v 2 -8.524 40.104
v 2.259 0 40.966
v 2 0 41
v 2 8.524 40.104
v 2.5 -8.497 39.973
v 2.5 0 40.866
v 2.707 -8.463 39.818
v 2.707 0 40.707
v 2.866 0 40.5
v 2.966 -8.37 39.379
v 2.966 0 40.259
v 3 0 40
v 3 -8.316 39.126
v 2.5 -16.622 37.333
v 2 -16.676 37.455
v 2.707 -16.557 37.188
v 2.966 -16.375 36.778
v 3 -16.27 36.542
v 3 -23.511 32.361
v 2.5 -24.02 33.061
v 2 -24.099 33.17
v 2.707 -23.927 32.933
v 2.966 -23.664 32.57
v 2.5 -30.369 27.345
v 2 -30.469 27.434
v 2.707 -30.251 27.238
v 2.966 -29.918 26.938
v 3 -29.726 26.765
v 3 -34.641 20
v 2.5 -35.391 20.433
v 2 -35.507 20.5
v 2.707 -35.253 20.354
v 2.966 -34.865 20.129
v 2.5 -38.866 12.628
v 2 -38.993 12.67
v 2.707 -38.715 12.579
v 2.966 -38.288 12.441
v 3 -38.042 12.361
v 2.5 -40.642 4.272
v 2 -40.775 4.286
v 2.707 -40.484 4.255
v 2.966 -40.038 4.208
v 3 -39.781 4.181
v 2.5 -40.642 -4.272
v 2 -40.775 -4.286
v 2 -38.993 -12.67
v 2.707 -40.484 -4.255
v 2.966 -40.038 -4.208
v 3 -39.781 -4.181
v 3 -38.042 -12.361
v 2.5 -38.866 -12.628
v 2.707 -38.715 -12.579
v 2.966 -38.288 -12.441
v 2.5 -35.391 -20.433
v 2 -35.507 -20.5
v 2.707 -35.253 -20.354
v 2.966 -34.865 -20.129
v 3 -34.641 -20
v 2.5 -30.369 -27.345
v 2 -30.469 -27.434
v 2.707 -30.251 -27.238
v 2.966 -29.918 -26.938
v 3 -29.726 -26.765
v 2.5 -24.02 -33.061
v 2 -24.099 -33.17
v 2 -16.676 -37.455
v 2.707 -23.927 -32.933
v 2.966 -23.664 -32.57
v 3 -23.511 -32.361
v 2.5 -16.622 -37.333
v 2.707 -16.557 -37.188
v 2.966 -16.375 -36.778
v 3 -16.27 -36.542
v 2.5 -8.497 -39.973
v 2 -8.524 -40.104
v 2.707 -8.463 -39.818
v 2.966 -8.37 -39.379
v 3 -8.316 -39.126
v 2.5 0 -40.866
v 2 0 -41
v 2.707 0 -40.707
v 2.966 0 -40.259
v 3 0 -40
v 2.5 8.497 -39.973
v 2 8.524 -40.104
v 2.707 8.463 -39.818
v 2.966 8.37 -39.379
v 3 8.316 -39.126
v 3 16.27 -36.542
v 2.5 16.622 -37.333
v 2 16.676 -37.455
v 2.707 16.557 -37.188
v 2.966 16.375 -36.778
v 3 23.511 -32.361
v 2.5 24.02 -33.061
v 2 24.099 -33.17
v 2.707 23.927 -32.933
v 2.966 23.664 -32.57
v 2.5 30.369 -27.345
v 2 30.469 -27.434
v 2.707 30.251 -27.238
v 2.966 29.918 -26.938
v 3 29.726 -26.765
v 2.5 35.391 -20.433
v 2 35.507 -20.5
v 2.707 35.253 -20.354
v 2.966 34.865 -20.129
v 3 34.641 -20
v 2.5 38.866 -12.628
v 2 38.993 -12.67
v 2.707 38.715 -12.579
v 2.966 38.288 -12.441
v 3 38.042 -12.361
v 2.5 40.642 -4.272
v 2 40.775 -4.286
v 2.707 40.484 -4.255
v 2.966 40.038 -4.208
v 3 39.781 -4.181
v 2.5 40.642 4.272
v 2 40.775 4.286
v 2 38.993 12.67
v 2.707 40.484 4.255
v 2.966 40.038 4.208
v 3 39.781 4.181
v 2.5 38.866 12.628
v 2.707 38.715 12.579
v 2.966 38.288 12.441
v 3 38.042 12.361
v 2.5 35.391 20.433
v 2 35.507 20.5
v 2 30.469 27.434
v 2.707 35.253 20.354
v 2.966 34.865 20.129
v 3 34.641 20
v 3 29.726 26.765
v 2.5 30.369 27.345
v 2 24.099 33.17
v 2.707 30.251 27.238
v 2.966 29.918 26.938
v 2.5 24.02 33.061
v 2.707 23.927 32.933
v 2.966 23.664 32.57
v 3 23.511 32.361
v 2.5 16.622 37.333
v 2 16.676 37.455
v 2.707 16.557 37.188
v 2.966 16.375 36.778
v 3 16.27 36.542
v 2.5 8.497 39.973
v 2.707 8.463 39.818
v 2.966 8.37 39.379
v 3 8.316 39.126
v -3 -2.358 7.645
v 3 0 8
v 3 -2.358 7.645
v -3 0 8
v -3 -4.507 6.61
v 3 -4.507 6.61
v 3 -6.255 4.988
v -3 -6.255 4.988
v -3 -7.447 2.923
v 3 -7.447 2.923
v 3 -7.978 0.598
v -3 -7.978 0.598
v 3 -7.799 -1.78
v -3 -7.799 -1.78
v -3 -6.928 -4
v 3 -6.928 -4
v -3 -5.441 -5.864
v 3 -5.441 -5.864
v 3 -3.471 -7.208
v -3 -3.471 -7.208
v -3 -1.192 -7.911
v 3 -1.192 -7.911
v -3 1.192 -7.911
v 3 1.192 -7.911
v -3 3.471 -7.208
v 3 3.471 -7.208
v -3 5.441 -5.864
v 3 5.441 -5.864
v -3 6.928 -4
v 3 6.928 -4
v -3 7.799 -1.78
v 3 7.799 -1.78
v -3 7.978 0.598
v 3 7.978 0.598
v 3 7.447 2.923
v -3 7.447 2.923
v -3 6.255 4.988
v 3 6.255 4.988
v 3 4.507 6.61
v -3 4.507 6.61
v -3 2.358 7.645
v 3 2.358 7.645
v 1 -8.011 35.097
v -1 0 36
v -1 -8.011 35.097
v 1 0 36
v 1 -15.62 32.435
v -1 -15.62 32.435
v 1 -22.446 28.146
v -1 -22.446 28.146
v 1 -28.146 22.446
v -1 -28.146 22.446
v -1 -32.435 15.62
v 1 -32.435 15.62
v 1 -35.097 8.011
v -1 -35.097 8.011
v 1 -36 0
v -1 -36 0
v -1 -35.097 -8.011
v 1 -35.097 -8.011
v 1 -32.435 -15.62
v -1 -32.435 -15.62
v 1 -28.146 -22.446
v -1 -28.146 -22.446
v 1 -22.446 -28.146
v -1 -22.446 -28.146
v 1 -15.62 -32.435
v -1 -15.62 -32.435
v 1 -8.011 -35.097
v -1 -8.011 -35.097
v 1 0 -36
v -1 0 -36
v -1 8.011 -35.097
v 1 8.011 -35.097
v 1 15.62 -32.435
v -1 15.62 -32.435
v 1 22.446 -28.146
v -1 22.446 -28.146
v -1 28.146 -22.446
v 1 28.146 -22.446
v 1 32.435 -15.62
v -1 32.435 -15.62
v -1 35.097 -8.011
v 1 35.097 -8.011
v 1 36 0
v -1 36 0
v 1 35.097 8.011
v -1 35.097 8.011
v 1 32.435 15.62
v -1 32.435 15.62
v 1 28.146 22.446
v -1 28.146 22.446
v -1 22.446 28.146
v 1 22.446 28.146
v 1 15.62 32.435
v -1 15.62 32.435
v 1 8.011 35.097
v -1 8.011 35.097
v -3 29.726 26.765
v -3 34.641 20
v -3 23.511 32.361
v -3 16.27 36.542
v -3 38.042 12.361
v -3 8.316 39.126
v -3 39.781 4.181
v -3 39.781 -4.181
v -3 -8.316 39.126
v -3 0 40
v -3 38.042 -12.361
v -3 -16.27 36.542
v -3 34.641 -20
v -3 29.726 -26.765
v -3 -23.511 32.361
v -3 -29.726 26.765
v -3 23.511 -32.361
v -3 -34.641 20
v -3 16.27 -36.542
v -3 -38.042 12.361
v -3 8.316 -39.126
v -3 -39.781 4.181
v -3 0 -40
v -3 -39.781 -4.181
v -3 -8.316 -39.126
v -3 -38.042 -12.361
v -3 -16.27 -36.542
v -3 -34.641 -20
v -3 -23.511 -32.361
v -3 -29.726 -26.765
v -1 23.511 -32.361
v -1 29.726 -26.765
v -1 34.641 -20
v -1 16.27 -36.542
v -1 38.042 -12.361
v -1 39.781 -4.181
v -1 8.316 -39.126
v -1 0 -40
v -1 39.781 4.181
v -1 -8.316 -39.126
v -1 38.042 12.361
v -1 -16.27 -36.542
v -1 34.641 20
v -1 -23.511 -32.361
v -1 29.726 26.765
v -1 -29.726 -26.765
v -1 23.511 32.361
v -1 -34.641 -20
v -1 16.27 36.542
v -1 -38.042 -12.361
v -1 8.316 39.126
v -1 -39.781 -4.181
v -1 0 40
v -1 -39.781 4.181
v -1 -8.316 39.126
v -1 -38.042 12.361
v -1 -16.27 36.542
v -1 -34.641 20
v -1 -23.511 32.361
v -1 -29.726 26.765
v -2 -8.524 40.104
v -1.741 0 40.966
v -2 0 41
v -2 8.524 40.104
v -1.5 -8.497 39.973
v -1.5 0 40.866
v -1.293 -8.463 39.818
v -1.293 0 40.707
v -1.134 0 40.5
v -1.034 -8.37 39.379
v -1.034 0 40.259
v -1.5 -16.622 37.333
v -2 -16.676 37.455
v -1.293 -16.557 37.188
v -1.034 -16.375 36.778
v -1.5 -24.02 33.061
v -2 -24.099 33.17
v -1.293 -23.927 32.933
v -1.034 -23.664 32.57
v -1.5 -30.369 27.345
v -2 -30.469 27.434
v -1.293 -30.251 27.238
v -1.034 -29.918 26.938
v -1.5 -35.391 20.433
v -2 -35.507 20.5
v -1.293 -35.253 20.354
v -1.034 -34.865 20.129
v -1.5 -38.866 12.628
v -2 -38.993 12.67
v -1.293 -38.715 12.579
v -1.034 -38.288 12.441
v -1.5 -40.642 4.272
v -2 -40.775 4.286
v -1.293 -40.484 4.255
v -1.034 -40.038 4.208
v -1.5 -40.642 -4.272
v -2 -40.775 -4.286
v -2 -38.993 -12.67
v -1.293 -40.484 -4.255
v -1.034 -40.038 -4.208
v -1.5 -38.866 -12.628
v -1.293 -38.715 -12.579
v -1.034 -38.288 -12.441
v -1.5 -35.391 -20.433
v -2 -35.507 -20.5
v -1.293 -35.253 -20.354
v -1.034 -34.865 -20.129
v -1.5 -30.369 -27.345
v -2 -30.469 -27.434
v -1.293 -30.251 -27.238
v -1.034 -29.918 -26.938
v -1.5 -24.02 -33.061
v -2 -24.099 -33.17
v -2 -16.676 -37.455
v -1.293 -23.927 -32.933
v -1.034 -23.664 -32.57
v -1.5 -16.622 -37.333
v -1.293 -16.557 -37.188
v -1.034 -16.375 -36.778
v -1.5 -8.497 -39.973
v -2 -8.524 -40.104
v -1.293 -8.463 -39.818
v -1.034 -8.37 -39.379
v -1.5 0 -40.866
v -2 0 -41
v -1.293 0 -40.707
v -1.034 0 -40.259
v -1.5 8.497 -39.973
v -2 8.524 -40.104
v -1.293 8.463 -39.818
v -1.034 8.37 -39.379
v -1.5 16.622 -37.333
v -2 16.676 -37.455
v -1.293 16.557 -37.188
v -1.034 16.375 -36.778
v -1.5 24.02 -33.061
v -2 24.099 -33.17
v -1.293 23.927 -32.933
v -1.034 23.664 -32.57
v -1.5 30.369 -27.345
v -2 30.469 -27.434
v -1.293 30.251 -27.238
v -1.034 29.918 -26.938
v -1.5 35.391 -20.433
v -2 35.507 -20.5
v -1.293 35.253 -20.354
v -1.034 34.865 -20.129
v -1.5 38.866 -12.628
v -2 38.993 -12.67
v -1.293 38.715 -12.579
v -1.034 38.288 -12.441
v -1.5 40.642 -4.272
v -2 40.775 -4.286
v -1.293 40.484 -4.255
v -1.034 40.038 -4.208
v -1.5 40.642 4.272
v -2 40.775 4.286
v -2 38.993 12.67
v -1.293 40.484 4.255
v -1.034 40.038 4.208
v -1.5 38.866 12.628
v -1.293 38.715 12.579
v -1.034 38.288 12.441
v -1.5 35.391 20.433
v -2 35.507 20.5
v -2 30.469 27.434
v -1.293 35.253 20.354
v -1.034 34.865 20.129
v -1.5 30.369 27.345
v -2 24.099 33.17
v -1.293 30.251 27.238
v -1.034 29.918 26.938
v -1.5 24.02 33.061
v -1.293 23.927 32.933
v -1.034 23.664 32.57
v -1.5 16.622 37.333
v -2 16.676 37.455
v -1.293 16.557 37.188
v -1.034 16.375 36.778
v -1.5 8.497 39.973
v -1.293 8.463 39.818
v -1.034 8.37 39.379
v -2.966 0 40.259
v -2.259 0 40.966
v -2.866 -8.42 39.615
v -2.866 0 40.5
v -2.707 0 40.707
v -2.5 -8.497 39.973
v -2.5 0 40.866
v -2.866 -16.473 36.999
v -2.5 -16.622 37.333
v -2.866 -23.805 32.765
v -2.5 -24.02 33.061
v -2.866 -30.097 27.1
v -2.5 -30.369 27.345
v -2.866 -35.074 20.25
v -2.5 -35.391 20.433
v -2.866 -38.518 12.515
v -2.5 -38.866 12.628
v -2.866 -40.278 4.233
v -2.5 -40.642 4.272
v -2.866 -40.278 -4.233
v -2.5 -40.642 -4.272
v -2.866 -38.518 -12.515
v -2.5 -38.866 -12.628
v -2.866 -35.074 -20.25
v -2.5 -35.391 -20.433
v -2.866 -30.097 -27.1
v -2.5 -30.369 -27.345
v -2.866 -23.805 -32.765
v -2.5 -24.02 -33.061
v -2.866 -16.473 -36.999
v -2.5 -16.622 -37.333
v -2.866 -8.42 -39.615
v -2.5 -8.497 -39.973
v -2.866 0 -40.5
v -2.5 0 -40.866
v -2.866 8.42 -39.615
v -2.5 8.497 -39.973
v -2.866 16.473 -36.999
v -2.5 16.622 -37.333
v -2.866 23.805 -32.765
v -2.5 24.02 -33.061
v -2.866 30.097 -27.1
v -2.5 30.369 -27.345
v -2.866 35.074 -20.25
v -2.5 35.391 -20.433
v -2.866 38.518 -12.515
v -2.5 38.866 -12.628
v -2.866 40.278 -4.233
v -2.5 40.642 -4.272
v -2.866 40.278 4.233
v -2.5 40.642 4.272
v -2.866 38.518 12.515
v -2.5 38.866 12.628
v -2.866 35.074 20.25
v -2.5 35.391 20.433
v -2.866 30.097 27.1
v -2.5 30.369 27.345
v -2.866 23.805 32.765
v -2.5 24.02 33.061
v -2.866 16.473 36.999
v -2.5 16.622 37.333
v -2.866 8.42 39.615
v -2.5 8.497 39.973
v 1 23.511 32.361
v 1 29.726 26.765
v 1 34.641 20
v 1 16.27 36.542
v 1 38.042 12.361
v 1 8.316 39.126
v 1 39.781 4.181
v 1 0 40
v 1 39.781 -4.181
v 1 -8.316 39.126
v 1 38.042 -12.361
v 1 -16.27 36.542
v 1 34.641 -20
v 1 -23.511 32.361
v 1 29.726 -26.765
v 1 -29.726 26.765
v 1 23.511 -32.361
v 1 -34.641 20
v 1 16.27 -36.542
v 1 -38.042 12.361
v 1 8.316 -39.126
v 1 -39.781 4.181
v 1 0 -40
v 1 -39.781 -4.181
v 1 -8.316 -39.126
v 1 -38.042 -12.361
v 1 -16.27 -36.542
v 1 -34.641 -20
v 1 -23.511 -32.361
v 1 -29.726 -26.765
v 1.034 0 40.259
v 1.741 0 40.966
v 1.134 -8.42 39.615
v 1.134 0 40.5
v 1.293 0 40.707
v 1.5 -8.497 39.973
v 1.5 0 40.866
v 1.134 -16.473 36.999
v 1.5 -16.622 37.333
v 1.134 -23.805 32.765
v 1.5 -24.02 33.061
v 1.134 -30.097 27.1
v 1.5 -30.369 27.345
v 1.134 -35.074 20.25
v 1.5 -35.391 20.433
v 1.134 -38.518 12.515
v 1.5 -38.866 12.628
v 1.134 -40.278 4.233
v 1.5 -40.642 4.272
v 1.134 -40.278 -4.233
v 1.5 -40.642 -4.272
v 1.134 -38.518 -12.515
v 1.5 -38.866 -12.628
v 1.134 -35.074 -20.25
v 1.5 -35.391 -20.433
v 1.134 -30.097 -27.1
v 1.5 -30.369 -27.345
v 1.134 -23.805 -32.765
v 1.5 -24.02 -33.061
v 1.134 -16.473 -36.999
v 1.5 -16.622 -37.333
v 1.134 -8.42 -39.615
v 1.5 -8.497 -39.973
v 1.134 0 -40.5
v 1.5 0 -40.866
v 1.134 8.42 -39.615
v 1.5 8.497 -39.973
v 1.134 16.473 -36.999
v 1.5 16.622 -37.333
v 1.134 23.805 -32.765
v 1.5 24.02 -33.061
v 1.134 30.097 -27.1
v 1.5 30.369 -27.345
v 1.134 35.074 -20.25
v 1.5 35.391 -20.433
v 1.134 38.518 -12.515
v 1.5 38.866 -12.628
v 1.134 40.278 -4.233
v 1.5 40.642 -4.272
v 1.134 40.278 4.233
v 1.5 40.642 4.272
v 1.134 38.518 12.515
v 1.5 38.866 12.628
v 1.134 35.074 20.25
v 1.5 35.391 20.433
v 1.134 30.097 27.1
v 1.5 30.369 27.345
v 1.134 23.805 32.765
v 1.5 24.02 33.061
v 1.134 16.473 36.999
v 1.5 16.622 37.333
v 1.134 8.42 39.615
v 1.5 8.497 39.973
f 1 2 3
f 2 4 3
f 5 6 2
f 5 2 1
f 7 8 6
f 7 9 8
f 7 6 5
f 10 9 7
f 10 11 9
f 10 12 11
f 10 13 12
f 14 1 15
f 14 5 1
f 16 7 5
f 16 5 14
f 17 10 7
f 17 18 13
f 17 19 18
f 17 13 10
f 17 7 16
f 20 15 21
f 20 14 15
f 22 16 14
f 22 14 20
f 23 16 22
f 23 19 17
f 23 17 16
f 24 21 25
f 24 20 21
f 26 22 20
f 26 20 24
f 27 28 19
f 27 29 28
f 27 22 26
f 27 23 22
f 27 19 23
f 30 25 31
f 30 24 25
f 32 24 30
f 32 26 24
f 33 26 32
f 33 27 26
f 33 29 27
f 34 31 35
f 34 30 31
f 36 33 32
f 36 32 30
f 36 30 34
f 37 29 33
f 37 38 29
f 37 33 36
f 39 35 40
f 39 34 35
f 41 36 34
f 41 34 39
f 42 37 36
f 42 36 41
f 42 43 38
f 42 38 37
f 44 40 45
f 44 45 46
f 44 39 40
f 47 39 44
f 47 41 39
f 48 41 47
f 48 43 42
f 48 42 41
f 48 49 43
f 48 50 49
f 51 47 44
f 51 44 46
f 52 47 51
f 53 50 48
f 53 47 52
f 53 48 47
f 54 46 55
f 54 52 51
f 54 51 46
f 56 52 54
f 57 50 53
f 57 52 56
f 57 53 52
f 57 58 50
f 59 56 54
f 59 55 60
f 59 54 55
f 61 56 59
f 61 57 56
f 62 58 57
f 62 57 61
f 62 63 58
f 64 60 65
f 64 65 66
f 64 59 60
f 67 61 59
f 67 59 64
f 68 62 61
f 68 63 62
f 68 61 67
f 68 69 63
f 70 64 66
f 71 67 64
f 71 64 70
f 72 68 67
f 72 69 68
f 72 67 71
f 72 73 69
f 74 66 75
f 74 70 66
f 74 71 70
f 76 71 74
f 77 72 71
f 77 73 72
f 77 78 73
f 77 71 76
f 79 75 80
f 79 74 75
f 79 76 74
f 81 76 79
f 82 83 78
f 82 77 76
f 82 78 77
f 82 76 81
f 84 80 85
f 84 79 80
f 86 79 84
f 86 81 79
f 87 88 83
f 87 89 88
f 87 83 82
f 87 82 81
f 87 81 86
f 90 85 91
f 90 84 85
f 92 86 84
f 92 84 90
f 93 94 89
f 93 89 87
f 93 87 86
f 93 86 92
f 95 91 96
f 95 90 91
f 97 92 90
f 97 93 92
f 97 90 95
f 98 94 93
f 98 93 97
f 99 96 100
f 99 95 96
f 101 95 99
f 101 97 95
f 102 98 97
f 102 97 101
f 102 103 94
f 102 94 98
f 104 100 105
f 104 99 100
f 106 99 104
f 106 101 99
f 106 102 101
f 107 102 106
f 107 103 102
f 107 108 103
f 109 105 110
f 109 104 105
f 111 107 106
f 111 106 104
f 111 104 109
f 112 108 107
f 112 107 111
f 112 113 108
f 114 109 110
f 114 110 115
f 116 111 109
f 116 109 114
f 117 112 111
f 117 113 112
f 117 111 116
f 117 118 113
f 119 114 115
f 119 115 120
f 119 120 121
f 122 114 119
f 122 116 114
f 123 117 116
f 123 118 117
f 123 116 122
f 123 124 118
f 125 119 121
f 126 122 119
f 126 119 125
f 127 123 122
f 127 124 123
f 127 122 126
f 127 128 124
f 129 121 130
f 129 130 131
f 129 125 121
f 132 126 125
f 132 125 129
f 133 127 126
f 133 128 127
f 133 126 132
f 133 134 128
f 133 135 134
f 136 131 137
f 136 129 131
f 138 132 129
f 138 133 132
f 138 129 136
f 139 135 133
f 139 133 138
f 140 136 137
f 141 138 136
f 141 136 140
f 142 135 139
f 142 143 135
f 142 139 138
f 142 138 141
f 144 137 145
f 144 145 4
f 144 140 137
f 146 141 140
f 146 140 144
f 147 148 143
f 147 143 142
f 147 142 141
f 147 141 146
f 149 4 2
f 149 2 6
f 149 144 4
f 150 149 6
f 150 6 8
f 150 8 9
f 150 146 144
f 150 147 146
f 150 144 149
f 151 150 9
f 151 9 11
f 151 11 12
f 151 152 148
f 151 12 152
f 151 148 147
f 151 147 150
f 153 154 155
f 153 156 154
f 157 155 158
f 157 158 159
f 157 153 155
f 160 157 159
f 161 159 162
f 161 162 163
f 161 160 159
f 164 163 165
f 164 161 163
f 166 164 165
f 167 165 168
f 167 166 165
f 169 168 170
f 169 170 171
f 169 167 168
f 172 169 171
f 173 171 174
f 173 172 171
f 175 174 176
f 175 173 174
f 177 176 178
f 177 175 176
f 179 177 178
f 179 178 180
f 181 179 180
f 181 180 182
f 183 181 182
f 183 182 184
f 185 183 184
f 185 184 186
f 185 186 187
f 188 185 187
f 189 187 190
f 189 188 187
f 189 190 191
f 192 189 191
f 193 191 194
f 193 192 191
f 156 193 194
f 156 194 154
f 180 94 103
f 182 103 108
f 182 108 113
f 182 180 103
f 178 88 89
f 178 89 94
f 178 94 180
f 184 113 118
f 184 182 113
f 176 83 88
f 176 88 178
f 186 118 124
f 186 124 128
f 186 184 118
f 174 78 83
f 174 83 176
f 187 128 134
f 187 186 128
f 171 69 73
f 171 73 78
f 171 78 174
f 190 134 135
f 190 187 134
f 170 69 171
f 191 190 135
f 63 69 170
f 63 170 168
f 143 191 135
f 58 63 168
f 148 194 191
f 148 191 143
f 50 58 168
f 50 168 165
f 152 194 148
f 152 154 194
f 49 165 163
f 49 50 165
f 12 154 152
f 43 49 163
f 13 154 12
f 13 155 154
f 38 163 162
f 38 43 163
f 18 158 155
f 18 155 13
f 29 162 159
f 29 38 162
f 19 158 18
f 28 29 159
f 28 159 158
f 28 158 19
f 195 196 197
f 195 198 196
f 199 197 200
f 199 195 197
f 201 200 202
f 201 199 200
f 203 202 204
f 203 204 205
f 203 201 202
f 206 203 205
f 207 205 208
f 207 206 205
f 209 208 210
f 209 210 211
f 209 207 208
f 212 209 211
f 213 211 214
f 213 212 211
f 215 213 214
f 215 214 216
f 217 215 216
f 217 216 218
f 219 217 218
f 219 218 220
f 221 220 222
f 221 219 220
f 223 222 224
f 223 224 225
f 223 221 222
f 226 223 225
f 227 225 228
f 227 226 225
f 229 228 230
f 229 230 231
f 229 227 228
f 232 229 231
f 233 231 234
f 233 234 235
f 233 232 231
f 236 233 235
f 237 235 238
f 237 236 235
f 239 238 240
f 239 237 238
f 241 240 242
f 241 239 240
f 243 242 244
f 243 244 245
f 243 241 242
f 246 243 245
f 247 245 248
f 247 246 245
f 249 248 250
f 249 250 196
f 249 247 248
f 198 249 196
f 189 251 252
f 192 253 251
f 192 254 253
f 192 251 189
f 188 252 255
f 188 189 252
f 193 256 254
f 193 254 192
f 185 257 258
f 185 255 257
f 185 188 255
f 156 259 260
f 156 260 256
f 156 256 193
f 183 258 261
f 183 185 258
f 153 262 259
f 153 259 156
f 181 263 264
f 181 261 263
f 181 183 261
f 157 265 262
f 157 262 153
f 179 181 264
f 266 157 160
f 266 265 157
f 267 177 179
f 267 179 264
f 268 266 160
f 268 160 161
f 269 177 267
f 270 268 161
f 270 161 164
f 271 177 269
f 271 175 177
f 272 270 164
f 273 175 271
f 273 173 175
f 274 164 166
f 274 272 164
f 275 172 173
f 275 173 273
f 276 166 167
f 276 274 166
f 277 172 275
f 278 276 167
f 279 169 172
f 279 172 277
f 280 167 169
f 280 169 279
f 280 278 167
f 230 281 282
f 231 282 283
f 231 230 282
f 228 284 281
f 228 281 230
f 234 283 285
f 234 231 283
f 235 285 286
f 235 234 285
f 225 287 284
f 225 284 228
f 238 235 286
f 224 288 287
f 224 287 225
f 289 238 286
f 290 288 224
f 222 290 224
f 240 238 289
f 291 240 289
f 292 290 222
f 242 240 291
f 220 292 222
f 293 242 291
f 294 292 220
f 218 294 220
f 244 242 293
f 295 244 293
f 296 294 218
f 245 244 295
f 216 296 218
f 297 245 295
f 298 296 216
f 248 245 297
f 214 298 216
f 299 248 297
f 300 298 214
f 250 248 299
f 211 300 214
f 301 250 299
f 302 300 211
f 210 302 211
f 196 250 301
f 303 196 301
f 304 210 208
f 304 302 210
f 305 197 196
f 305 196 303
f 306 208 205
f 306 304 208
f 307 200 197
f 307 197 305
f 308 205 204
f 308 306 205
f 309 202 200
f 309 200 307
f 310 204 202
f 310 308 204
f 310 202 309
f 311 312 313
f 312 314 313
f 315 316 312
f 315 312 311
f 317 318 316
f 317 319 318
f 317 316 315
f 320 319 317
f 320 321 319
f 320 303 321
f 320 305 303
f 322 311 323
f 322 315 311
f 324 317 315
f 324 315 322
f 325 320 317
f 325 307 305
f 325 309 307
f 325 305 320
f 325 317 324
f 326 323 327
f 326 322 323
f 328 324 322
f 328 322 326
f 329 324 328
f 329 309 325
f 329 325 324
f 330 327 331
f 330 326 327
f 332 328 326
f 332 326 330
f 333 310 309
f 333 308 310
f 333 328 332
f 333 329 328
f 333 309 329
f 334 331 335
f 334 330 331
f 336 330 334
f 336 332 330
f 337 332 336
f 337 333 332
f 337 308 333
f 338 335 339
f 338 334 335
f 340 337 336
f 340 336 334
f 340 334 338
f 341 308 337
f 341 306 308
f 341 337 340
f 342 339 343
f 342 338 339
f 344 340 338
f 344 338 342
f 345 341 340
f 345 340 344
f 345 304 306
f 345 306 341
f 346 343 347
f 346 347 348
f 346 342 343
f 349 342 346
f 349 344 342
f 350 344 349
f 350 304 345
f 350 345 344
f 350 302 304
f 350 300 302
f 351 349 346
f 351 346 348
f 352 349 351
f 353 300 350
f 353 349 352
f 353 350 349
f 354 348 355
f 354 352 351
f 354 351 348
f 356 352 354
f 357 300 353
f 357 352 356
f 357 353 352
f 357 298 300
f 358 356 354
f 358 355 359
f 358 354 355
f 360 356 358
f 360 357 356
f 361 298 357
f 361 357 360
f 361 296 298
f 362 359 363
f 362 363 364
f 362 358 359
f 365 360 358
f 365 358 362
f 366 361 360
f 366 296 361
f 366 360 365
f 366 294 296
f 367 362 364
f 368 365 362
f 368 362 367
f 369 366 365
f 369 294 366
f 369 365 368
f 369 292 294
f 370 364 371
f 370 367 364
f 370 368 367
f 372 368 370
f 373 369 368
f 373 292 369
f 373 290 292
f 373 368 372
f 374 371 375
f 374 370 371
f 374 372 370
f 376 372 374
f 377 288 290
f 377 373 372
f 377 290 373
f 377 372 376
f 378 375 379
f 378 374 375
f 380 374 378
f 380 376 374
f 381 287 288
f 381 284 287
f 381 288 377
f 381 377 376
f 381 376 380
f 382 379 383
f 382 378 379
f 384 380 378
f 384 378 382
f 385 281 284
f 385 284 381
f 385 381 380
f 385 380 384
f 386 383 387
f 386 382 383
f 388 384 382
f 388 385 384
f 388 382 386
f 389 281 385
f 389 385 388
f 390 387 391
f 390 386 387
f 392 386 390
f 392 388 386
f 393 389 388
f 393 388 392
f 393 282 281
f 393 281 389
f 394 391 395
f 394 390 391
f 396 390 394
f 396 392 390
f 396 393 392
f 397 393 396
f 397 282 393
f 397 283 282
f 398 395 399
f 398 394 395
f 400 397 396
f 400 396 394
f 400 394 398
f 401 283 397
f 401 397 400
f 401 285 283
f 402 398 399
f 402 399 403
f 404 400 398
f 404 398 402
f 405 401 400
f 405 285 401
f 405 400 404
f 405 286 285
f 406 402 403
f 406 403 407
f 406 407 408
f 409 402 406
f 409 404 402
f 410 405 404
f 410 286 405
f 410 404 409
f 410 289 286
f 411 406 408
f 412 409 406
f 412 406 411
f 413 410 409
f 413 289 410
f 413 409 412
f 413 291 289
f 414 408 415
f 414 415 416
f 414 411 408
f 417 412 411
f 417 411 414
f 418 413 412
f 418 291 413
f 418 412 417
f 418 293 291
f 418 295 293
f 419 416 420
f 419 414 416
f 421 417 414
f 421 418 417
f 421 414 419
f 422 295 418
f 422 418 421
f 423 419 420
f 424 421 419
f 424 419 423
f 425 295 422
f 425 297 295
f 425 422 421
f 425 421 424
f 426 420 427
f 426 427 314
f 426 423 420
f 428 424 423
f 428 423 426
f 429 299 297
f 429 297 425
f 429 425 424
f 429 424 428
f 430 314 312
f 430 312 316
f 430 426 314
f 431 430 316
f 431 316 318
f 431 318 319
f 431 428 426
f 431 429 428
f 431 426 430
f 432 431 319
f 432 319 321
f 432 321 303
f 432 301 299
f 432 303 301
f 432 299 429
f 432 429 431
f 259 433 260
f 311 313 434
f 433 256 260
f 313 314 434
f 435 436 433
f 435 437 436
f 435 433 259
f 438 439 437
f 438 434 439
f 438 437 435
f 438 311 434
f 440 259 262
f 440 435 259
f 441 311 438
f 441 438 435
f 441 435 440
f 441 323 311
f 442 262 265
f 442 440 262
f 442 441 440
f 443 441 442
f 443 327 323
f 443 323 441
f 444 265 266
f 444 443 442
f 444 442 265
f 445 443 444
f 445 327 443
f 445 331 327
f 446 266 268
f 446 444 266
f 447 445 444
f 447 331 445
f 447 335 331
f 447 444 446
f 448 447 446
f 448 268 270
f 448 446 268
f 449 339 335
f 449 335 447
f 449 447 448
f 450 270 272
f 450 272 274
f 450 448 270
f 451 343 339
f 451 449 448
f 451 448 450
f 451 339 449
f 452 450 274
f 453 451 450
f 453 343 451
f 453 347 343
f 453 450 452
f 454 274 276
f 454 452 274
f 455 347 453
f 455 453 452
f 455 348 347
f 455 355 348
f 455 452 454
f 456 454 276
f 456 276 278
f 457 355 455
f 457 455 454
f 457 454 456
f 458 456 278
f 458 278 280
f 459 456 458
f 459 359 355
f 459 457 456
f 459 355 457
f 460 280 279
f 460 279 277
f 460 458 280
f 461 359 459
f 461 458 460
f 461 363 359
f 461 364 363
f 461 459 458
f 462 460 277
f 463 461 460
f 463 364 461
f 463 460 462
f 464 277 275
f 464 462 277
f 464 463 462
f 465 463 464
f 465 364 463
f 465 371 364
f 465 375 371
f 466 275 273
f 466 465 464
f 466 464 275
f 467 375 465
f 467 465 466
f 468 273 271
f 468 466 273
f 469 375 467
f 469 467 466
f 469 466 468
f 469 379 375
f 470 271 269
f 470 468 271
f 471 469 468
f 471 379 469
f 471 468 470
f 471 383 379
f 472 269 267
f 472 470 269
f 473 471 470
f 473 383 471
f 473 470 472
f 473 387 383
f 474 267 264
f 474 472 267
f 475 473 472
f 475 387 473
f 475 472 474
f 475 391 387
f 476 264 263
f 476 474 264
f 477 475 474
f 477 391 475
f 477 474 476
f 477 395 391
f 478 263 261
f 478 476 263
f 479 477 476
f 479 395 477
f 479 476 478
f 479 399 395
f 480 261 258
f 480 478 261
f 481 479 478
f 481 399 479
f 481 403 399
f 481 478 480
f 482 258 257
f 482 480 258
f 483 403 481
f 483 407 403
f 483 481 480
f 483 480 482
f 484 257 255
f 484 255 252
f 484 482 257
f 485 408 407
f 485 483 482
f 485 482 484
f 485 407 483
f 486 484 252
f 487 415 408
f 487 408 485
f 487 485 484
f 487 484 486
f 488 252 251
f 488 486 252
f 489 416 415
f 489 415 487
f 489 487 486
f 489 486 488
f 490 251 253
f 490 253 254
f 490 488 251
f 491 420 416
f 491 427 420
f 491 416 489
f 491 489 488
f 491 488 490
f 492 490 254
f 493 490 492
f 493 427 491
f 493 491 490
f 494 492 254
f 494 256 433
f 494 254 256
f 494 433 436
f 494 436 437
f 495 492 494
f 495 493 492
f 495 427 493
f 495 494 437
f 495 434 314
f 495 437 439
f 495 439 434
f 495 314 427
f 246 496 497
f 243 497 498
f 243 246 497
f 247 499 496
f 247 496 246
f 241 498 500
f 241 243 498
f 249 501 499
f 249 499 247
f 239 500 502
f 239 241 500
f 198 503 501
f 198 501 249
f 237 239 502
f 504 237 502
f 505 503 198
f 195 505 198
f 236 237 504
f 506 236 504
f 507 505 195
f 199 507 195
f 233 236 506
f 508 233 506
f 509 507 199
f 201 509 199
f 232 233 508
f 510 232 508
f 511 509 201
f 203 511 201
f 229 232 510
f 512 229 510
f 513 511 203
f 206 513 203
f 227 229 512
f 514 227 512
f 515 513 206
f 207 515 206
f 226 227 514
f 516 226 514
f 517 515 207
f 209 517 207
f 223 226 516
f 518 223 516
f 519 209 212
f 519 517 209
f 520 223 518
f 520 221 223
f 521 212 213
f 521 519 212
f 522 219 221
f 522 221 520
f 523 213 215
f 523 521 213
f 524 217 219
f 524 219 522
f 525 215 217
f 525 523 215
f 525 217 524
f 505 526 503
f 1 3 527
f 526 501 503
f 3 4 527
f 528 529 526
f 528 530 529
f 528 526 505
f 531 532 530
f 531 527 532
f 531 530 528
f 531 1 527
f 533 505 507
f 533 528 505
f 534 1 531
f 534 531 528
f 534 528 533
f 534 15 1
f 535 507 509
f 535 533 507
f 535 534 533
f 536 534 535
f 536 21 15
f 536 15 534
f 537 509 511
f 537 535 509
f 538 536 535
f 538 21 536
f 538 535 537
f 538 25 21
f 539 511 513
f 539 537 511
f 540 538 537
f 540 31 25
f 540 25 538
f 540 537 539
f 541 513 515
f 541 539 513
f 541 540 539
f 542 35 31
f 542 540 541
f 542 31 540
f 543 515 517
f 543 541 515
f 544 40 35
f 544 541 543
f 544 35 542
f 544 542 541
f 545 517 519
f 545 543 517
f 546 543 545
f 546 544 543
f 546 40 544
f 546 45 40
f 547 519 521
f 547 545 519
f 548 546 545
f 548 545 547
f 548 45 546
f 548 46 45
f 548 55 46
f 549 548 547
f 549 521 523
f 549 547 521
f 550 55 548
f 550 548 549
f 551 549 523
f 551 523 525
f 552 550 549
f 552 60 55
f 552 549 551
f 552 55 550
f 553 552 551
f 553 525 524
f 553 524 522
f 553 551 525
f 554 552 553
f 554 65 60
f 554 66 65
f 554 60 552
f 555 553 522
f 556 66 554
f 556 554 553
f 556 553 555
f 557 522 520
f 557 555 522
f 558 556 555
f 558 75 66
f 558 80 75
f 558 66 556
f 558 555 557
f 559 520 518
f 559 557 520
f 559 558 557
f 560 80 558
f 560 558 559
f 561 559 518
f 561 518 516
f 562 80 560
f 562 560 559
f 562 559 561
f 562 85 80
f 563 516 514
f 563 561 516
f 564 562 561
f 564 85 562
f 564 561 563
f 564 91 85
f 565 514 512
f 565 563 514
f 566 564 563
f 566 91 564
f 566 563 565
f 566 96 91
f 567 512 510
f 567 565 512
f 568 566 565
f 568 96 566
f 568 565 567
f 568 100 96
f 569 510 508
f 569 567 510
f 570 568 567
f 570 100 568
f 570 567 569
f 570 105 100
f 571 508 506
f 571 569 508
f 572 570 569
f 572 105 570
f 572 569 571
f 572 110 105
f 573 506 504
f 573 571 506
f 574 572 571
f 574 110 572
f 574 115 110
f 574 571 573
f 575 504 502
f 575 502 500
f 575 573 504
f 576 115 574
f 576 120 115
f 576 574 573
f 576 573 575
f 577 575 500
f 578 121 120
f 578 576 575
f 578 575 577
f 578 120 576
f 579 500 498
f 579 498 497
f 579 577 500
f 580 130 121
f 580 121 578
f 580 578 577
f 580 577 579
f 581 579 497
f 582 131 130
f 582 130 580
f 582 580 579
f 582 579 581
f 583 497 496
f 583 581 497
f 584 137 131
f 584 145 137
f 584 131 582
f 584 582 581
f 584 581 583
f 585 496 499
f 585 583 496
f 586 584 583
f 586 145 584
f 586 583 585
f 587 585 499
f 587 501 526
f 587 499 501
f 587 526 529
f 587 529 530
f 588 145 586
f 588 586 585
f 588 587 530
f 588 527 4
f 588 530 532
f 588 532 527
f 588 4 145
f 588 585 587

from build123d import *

# Parameters (mm, degrees)
CONG_1_R = 1


with BuildPart() as part:
    # Esquisse1 → Révolution2 (revolve)
    with BuildSketch(Plane.XY, mode=Mode.PRIVATE) as r_volution2_sk:
        Polygon((-1, 36), (1, 36), (1, 41), (3, 41), (3, 8), (-3, 8), (-3, 41), (-1, 41), align=None)
    revolve(r_volution2_sk.sketch.rotate(Axis((0, 0, 0), (1, 0, 0)), 90), axis=Axis((0, 0, 0), (1, 0, 0)))

    # Congé1
    cong_1_edges = [part.edges().sort_by_distance(p)[0] for p in [
        (-3, 0, -41),
        (-1, 0, -41),
        (1, 0, -41),
        (3, 0, -41),
    ]]
    fillet(cong_1_edges, radius=CONG_1_R - 0.0001)  # a hair under: the kernel refuses the full size


solid = part.part
